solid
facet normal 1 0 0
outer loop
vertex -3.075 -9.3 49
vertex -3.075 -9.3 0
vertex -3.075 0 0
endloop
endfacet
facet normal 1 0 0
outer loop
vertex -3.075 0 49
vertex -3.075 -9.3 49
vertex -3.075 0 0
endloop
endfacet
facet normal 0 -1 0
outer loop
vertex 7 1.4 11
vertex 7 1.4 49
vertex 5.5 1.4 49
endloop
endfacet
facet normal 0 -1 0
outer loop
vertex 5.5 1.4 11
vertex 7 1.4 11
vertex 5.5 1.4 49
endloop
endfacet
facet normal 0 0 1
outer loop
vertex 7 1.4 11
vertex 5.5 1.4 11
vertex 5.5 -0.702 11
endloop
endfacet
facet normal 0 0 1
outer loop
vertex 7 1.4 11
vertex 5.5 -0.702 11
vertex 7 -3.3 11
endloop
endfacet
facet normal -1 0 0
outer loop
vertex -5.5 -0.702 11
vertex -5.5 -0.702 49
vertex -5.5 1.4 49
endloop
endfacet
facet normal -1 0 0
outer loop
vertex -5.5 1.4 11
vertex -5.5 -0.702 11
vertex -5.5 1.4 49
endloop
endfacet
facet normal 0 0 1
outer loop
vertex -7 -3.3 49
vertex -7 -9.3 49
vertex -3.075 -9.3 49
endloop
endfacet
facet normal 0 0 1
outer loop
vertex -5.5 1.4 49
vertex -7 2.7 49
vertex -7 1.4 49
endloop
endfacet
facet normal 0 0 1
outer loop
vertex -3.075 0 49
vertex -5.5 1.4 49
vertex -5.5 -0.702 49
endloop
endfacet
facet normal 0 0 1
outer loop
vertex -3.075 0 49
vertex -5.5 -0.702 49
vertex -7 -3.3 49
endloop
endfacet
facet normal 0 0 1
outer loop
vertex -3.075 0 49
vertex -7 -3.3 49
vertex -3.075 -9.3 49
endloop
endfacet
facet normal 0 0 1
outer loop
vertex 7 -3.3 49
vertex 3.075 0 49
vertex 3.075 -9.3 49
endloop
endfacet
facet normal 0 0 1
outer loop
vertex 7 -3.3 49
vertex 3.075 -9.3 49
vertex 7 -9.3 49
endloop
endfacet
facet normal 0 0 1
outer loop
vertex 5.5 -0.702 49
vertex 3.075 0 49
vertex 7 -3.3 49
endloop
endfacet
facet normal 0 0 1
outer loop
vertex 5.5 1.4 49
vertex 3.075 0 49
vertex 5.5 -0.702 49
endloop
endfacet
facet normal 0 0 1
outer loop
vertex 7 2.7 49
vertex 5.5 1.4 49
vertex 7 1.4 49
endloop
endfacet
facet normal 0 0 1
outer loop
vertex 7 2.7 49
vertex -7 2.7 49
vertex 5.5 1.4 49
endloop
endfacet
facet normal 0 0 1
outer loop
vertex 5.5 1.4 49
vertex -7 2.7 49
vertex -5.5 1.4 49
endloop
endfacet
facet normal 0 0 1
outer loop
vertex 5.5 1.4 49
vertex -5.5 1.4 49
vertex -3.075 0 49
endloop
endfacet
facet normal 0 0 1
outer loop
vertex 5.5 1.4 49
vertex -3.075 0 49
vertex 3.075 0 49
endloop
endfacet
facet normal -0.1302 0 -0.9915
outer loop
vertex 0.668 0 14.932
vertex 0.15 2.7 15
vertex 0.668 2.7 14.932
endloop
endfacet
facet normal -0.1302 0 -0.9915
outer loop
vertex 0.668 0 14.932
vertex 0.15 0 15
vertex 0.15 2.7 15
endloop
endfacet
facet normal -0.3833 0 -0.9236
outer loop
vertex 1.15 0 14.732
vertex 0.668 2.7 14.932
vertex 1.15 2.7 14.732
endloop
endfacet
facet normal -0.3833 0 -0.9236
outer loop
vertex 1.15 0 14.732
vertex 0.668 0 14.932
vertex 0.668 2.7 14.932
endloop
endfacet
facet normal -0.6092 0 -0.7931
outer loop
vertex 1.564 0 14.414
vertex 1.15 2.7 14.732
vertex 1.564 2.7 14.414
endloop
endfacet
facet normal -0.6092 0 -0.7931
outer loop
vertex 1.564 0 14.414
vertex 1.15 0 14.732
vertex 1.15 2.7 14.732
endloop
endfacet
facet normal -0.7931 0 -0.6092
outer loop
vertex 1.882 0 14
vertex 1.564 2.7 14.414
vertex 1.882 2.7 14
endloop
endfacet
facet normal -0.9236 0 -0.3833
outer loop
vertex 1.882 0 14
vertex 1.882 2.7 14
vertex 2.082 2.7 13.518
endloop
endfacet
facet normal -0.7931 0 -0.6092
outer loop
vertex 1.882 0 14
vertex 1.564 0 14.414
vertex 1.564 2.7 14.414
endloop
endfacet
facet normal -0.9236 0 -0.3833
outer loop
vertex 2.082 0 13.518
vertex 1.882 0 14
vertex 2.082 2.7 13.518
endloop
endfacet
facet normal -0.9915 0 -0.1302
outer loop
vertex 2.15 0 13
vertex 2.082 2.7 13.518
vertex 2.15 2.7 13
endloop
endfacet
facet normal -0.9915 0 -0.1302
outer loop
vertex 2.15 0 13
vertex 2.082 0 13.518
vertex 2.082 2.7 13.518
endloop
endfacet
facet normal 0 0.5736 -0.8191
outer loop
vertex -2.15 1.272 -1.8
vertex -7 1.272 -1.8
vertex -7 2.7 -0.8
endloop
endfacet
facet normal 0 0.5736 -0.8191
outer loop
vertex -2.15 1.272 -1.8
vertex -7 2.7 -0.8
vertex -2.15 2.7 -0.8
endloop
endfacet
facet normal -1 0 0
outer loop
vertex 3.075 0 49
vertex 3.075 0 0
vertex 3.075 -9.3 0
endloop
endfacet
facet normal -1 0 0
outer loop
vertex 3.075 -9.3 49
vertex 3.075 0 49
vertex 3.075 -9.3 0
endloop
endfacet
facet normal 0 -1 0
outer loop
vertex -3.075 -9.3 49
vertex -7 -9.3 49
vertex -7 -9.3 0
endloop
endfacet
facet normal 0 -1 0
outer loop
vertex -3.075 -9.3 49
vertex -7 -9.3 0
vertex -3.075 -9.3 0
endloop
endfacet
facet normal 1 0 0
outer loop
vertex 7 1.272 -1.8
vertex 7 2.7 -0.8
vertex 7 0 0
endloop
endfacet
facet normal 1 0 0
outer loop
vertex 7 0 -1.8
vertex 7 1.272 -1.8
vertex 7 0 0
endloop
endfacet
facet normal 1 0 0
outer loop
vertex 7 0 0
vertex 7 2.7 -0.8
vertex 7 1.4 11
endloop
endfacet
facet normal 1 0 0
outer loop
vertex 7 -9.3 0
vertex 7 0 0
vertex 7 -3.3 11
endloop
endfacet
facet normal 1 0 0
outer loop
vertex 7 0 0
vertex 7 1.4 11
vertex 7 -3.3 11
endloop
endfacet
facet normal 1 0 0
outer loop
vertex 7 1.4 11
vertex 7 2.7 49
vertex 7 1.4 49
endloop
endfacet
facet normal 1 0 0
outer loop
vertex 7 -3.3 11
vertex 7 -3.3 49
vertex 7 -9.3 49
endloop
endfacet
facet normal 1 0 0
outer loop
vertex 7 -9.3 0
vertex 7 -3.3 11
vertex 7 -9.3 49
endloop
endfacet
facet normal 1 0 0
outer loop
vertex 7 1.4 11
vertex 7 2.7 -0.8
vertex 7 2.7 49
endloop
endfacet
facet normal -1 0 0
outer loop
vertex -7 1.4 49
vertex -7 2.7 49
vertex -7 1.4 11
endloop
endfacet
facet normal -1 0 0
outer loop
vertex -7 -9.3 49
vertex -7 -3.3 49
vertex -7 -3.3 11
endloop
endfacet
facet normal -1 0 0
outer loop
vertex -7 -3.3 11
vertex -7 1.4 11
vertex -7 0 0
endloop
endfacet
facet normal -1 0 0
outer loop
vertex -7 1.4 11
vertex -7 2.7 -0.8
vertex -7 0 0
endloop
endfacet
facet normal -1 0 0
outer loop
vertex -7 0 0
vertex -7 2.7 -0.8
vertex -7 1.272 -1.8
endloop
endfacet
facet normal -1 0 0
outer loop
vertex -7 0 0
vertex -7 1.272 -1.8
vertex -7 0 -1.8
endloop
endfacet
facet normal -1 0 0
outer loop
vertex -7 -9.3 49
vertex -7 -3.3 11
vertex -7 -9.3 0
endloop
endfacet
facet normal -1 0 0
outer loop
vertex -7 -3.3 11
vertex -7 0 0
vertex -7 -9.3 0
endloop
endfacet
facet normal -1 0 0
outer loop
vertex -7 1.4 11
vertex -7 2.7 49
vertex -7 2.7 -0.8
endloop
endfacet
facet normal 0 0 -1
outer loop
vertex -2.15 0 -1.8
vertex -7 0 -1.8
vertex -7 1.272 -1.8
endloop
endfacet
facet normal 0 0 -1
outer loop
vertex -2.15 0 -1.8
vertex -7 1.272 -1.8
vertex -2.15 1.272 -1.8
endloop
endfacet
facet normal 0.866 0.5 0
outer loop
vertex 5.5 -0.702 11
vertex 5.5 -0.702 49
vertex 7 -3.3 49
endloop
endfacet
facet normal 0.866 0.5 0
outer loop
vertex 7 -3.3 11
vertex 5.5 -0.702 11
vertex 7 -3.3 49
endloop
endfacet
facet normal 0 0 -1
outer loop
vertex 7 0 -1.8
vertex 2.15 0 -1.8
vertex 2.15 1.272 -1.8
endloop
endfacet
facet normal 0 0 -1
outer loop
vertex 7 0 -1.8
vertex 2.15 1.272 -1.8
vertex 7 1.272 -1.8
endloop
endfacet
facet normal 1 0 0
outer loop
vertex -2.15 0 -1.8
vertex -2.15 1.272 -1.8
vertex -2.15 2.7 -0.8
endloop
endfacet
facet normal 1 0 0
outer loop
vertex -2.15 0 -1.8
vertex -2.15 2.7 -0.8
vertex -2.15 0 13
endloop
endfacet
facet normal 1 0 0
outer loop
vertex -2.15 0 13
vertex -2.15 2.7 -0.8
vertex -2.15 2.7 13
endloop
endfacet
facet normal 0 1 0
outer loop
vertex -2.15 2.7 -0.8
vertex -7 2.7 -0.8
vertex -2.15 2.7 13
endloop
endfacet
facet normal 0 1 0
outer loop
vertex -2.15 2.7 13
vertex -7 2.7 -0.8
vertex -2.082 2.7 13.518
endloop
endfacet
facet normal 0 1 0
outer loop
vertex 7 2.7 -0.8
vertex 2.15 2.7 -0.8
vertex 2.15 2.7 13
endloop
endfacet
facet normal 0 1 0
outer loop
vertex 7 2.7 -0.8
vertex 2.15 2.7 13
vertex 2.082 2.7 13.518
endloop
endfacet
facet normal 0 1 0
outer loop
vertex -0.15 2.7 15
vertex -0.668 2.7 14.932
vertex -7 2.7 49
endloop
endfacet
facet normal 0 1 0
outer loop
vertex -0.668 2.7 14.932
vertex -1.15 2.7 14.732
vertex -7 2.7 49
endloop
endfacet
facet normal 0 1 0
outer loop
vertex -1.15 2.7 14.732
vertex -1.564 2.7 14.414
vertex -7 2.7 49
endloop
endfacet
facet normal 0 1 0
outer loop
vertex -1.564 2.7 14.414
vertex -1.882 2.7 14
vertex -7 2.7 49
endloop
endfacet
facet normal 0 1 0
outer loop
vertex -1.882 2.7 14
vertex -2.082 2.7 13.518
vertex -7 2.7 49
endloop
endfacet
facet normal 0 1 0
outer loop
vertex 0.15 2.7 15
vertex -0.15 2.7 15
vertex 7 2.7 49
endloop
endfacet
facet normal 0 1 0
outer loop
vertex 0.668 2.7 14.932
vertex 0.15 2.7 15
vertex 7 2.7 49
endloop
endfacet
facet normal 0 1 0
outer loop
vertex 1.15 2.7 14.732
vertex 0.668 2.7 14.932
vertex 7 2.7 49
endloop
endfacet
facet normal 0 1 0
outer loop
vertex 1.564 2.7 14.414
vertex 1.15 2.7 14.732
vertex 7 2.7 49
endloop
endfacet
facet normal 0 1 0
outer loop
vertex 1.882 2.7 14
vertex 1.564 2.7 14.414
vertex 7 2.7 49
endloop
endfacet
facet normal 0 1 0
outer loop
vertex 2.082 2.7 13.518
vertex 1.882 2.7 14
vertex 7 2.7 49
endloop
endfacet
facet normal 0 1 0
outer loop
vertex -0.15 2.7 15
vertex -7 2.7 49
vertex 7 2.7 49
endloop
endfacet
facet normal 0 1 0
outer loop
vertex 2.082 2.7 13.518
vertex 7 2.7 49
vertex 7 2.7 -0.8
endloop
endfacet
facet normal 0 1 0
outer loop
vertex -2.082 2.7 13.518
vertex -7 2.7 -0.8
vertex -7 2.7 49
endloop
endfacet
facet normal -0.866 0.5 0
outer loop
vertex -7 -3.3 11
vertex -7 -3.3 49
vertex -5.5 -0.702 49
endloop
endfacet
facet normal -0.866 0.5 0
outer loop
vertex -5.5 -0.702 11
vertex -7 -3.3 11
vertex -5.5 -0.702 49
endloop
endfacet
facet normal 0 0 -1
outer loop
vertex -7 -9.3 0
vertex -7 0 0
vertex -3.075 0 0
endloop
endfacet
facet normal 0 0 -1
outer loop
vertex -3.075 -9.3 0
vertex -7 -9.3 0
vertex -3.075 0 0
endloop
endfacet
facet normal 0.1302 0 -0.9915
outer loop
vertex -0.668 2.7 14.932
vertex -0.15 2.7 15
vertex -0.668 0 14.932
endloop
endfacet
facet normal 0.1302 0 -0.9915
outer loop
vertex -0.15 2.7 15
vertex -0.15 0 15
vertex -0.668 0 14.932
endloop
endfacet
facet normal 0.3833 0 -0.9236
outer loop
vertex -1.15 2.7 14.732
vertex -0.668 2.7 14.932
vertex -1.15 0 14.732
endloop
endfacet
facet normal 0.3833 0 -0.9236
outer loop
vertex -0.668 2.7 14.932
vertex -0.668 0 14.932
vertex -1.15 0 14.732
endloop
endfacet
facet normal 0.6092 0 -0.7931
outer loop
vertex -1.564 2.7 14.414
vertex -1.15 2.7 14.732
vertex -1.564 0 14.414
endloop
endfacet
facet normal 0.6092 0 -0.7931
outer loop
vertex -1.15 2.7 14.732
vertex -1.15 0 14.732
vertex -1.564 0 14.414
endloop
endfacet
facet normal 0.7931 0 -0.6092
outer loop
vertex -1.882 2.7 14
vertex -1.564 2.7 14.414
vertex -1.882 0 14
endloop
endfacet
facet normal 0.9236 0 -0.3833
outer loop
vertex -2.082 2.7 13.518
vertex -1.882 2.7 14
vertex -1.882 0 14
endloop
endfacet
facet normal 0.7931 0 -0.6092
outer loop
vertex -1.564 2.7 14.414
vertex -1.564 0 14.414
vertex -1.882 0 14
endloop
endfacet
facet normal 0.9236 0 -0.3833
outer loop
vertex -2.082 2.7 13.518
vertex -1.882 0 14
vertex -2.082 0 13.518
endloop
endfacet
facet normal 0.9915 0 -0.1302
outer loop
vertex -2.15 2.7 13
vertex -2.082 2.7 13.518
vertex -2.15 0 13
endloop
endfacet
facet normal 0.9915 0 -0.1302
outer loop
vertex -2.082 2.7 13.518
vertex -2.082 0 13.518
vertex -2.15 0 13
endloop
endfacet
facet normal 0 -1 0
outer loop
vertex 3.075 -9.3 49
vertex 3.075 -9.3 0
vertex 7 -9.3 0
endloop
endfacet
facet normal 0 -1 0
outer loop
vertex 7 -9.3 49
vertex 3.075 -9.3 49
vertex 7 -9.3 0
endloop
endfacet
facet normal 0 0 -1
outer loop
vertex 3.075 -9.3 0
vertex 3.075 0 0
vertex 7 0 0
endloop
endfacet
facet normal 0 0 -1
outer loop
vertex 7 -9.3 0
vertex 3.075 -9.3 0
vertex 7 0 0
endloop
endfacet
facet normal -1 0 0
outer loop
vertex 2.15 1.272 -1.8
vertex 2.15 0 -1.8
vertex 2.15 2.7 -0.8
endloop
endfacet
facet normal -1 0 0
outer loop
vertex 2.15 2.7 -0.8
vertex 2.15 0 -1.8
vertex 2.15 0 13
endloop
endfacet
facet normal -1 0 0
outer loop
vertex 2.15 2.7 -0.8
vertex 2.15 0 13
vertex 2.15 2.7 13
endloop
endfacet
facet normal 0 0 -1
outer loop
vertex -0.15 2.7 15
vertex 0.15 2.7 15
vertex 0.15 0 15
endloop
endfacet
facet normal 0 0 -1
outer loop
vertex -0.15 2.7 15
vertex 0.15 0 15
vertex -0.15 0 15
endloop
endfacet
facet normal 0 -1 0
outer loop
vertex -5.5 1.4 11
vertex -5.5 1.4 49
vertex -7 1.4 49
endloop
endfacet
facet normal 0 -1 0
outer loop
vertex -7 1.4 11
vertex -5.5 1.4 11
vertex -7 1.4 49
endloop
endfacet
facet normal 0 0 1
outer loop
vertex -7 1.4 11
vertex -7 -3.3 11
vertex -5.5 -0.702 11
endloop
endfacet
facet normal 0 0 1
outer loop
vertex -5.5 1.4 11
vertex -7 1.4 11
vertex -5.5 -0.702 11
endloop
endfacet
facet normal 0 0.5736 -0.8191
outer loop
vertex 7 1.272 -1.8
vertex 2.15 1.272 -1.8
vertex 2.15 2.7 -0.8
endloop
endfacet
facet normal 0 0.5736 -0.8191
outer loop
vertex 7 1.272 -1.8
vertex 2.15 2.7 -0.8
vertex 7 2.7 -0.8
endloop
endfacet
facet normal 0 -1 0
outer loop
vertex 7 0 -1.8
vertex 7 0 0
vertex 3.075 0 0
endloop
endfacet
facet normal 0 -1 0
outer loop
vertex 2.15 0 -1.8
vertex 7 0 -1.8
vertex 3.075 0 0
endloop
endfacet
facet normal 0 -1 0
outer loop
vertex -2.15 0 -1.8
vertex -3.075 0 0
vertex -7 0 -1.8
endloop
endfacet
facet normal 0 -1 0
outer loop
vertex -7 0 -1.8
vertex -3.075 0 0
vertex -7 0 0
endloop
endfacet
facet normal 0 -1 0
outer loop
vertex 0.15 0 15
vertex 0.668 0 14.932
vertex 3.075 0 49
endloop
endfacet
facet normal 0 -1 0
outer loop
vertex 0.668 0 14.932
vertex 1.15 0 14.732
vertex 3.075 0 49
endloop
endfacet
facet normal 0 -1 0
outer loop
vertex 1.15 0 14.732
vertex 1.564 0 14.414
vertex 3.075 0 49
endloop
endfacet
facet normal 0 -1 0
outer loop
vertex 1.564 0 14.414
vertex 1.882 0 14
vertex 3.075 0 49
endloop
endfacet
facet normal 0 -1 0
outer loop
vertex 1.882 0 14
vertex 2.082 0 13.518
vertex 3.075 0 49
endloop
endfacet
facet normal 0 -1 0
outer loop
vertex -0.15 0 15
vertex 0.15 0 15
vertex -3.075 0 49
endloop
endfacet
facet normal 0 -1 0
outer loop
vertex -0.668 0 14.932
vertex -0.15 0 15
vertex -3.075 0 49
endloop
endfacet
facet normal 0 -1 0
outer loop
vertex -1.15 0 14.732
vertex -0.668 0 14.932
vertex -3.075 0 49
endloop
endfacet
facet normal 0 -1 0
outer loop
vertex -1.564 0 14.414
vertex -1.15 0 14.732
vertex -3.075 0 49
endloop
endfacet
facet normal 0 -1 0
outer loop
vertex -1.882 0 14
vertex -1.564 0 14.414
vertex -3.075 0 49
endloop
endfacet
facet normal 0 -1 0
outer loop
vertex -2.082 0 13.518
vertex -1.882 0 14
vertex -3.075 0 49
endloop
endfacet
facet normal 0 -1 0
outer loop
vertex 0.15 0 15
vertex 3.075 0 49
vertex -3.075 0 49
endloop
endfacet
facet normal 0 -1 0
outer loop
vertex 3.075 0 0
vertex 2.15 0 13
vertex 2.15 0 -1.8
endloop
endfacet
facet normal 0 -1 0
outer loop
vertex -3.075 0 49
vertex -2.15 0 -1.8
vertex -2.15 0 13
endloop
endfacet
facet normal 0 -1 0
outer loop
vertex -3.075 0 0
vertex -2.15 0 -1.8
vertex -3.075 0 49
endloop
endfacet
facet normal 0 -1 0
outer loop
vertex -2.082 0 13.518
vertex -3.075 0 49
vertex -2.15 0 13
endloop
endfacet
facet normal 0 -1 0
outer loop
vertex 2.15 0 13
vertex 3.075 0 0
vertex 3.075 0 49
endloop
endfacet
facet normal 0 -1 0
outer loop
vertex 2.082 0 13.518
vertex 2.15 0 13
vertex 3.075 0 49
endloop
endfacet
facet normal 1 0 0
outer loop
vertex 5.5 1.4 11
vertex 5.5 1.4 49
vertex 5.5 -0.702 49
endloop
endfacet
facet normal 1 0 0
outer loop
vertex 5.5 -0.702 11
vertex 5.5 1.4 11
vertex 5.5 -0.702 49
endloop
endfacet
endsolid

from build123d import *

# Parameters (mm, degrees)
F1_DEPTH = 49
F2_W     = 4.3
F2_H     = 15
F3_DEPTH = 25
F4_W     = 4.85
F4_H     = 2.7
F5_DEPTH = 1.8
F6_R     = 2
F7_SIZE2 = 1.4281480067
F7_SIZE  = 1
F9_DEPTH = 38


with BuildPart() as f1:
    # F0 (on Top) → F1 (new body)
    with BuildSketch(Plane.XY):
        Polygon((-3.075, -9.3), (-3.075, 0), (0, 0), (3.075, 0), (3.075, -9.3), (7, -9.3), (7, 2.7), (0, 2.7), (-7, 2.7), (-7, -9.3), align=None)
    extrude(amount=F1_DEPTH)

    # F2 (on face) → F3 (cut)
    with BuildSketch(Plane(origin=(0, 2.7, 0), x_dir=(-1, 0, 0), z_dir=(0, 1, 0))):
        with Locations((0, 7.5)):
            Rectangle(F2_W, F2_H)
    extrude(amount=-F3_DEPTH, mode=Mode.SUBTRACT)

    # F4 (on face) → F5 (join)
    with BuildSketch(Plane(origin=(0, 0, 0), x_dir=(1, 0, 0), z_dir=(0, 0, -1))):
        Polygon((2.15, -2.7), (7, -2.7), (7, 0), (3.075, 0), (2.15, 0), align=None)
        with Locations((-4.575, -1.35)):
            Rectangle(F4_W, F4_H)
    extrude(amount=F5_DEPTH)

    # F6
    f6_edges = [f1.edges().sort_by_distance(p)[0] for p in [
        (2.15, 1.35, 15),
        (-2.15, 1.35, 15),
    ]]
    fillet(f6_edges, radius=F6_R)

    # F7
    f7_edges = [f1.edges().sort_by_distance(p)[0] for p in [
        (4.575, 2.7, -1.8),
        (-4.575, 2.7, -1.8),
    ]]
    f7_side = f1.faces().sort_by_distance((0, 2.7, 25.492605))[0]
    chamfer(f7_edges, length=F7_SIZE, length2=F7_SIZE2, reference=f7_side)

    # F8 (on face) → F9 (cut)
    with BuildSketch(Plane.XY.offset(49)):
        Polygon((7, -3.3), (7, 1.4), (5.5, 1.4), (5.5, -0.7019237886), align=None)
        Polygon((-5.5, 1.4), (-7, 1.4), (-7, -3.3), (-5.5, -0.7019237886), align=None)
    extrude(amount=-F9_DEPTH, mode=Mode.SUBTRACT)


solid = f1.part
